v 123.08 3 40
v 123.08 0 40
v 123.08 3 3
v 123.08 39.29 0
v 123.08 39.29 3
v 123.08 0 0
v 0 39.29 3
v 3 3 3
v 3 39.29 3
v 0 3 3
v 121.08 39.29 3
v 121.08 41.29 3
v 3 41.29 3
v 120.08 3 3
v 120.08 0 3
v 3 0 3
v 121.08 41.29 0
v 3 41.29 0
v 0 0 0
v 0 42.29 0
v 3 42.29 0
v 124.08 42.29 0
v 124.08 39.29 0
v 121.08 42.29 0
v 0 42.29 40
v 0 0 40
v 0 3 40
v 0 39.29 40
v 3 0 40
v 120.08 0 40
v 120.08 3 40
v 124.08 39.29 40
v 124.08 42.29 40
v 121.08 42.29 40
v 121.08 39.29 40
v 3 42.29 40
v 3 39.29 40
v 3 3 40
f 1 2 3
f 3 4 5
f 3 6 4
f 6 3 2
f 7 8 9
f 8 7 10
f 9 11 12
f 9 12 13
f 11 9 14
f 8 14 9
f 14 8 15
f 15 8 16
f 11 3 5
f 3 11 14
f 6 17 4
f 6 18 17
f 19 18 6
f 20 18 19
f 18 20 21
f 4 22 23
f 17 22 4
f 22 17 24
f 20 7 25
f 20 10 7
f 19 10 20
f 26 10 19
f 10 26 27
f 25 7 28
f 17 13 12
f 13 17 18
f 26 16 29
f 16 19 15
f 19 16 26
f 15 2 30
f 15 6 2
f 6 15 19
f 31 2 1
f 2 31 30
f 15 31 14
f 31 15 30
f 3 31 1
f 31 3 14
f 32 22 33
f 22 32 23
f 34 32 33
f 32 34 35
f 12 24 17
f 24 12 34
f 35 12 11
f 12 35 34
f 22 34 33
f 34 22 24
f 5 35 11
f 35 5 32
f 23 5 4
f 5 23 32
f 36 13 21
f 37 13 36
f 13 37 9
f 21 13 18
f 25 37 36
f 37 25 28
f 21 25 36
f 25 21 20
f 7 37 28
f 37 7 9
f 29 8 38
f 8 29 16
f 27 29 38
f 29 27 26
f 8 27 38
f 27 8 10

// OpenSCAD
width_of_edge=3;
height_of_edges=40;
module edge() {
    cube([width_of_edge, width_of_edge, height_of_edges]);
}
      
cube([61.54*2,
      41.29,
      width_of_edge]);

      
translate([61.54*2 - width_of_edge,0,0]) edge();
translate([61.54*2 - 2,41.29-2,0]) edge();
translate([0,41.29-2,0]) edge();
edge();

/**
translate([0,0,20]) cube([2,41.29,2]);
translate([0,0,20]) cube([61.54*2,2,2]);
translate([61.54*2-2,0,20]) cube([2,41.29,2]);
translate([0,41.29-2,20]) cube([61.54*2,2,2]);**/
